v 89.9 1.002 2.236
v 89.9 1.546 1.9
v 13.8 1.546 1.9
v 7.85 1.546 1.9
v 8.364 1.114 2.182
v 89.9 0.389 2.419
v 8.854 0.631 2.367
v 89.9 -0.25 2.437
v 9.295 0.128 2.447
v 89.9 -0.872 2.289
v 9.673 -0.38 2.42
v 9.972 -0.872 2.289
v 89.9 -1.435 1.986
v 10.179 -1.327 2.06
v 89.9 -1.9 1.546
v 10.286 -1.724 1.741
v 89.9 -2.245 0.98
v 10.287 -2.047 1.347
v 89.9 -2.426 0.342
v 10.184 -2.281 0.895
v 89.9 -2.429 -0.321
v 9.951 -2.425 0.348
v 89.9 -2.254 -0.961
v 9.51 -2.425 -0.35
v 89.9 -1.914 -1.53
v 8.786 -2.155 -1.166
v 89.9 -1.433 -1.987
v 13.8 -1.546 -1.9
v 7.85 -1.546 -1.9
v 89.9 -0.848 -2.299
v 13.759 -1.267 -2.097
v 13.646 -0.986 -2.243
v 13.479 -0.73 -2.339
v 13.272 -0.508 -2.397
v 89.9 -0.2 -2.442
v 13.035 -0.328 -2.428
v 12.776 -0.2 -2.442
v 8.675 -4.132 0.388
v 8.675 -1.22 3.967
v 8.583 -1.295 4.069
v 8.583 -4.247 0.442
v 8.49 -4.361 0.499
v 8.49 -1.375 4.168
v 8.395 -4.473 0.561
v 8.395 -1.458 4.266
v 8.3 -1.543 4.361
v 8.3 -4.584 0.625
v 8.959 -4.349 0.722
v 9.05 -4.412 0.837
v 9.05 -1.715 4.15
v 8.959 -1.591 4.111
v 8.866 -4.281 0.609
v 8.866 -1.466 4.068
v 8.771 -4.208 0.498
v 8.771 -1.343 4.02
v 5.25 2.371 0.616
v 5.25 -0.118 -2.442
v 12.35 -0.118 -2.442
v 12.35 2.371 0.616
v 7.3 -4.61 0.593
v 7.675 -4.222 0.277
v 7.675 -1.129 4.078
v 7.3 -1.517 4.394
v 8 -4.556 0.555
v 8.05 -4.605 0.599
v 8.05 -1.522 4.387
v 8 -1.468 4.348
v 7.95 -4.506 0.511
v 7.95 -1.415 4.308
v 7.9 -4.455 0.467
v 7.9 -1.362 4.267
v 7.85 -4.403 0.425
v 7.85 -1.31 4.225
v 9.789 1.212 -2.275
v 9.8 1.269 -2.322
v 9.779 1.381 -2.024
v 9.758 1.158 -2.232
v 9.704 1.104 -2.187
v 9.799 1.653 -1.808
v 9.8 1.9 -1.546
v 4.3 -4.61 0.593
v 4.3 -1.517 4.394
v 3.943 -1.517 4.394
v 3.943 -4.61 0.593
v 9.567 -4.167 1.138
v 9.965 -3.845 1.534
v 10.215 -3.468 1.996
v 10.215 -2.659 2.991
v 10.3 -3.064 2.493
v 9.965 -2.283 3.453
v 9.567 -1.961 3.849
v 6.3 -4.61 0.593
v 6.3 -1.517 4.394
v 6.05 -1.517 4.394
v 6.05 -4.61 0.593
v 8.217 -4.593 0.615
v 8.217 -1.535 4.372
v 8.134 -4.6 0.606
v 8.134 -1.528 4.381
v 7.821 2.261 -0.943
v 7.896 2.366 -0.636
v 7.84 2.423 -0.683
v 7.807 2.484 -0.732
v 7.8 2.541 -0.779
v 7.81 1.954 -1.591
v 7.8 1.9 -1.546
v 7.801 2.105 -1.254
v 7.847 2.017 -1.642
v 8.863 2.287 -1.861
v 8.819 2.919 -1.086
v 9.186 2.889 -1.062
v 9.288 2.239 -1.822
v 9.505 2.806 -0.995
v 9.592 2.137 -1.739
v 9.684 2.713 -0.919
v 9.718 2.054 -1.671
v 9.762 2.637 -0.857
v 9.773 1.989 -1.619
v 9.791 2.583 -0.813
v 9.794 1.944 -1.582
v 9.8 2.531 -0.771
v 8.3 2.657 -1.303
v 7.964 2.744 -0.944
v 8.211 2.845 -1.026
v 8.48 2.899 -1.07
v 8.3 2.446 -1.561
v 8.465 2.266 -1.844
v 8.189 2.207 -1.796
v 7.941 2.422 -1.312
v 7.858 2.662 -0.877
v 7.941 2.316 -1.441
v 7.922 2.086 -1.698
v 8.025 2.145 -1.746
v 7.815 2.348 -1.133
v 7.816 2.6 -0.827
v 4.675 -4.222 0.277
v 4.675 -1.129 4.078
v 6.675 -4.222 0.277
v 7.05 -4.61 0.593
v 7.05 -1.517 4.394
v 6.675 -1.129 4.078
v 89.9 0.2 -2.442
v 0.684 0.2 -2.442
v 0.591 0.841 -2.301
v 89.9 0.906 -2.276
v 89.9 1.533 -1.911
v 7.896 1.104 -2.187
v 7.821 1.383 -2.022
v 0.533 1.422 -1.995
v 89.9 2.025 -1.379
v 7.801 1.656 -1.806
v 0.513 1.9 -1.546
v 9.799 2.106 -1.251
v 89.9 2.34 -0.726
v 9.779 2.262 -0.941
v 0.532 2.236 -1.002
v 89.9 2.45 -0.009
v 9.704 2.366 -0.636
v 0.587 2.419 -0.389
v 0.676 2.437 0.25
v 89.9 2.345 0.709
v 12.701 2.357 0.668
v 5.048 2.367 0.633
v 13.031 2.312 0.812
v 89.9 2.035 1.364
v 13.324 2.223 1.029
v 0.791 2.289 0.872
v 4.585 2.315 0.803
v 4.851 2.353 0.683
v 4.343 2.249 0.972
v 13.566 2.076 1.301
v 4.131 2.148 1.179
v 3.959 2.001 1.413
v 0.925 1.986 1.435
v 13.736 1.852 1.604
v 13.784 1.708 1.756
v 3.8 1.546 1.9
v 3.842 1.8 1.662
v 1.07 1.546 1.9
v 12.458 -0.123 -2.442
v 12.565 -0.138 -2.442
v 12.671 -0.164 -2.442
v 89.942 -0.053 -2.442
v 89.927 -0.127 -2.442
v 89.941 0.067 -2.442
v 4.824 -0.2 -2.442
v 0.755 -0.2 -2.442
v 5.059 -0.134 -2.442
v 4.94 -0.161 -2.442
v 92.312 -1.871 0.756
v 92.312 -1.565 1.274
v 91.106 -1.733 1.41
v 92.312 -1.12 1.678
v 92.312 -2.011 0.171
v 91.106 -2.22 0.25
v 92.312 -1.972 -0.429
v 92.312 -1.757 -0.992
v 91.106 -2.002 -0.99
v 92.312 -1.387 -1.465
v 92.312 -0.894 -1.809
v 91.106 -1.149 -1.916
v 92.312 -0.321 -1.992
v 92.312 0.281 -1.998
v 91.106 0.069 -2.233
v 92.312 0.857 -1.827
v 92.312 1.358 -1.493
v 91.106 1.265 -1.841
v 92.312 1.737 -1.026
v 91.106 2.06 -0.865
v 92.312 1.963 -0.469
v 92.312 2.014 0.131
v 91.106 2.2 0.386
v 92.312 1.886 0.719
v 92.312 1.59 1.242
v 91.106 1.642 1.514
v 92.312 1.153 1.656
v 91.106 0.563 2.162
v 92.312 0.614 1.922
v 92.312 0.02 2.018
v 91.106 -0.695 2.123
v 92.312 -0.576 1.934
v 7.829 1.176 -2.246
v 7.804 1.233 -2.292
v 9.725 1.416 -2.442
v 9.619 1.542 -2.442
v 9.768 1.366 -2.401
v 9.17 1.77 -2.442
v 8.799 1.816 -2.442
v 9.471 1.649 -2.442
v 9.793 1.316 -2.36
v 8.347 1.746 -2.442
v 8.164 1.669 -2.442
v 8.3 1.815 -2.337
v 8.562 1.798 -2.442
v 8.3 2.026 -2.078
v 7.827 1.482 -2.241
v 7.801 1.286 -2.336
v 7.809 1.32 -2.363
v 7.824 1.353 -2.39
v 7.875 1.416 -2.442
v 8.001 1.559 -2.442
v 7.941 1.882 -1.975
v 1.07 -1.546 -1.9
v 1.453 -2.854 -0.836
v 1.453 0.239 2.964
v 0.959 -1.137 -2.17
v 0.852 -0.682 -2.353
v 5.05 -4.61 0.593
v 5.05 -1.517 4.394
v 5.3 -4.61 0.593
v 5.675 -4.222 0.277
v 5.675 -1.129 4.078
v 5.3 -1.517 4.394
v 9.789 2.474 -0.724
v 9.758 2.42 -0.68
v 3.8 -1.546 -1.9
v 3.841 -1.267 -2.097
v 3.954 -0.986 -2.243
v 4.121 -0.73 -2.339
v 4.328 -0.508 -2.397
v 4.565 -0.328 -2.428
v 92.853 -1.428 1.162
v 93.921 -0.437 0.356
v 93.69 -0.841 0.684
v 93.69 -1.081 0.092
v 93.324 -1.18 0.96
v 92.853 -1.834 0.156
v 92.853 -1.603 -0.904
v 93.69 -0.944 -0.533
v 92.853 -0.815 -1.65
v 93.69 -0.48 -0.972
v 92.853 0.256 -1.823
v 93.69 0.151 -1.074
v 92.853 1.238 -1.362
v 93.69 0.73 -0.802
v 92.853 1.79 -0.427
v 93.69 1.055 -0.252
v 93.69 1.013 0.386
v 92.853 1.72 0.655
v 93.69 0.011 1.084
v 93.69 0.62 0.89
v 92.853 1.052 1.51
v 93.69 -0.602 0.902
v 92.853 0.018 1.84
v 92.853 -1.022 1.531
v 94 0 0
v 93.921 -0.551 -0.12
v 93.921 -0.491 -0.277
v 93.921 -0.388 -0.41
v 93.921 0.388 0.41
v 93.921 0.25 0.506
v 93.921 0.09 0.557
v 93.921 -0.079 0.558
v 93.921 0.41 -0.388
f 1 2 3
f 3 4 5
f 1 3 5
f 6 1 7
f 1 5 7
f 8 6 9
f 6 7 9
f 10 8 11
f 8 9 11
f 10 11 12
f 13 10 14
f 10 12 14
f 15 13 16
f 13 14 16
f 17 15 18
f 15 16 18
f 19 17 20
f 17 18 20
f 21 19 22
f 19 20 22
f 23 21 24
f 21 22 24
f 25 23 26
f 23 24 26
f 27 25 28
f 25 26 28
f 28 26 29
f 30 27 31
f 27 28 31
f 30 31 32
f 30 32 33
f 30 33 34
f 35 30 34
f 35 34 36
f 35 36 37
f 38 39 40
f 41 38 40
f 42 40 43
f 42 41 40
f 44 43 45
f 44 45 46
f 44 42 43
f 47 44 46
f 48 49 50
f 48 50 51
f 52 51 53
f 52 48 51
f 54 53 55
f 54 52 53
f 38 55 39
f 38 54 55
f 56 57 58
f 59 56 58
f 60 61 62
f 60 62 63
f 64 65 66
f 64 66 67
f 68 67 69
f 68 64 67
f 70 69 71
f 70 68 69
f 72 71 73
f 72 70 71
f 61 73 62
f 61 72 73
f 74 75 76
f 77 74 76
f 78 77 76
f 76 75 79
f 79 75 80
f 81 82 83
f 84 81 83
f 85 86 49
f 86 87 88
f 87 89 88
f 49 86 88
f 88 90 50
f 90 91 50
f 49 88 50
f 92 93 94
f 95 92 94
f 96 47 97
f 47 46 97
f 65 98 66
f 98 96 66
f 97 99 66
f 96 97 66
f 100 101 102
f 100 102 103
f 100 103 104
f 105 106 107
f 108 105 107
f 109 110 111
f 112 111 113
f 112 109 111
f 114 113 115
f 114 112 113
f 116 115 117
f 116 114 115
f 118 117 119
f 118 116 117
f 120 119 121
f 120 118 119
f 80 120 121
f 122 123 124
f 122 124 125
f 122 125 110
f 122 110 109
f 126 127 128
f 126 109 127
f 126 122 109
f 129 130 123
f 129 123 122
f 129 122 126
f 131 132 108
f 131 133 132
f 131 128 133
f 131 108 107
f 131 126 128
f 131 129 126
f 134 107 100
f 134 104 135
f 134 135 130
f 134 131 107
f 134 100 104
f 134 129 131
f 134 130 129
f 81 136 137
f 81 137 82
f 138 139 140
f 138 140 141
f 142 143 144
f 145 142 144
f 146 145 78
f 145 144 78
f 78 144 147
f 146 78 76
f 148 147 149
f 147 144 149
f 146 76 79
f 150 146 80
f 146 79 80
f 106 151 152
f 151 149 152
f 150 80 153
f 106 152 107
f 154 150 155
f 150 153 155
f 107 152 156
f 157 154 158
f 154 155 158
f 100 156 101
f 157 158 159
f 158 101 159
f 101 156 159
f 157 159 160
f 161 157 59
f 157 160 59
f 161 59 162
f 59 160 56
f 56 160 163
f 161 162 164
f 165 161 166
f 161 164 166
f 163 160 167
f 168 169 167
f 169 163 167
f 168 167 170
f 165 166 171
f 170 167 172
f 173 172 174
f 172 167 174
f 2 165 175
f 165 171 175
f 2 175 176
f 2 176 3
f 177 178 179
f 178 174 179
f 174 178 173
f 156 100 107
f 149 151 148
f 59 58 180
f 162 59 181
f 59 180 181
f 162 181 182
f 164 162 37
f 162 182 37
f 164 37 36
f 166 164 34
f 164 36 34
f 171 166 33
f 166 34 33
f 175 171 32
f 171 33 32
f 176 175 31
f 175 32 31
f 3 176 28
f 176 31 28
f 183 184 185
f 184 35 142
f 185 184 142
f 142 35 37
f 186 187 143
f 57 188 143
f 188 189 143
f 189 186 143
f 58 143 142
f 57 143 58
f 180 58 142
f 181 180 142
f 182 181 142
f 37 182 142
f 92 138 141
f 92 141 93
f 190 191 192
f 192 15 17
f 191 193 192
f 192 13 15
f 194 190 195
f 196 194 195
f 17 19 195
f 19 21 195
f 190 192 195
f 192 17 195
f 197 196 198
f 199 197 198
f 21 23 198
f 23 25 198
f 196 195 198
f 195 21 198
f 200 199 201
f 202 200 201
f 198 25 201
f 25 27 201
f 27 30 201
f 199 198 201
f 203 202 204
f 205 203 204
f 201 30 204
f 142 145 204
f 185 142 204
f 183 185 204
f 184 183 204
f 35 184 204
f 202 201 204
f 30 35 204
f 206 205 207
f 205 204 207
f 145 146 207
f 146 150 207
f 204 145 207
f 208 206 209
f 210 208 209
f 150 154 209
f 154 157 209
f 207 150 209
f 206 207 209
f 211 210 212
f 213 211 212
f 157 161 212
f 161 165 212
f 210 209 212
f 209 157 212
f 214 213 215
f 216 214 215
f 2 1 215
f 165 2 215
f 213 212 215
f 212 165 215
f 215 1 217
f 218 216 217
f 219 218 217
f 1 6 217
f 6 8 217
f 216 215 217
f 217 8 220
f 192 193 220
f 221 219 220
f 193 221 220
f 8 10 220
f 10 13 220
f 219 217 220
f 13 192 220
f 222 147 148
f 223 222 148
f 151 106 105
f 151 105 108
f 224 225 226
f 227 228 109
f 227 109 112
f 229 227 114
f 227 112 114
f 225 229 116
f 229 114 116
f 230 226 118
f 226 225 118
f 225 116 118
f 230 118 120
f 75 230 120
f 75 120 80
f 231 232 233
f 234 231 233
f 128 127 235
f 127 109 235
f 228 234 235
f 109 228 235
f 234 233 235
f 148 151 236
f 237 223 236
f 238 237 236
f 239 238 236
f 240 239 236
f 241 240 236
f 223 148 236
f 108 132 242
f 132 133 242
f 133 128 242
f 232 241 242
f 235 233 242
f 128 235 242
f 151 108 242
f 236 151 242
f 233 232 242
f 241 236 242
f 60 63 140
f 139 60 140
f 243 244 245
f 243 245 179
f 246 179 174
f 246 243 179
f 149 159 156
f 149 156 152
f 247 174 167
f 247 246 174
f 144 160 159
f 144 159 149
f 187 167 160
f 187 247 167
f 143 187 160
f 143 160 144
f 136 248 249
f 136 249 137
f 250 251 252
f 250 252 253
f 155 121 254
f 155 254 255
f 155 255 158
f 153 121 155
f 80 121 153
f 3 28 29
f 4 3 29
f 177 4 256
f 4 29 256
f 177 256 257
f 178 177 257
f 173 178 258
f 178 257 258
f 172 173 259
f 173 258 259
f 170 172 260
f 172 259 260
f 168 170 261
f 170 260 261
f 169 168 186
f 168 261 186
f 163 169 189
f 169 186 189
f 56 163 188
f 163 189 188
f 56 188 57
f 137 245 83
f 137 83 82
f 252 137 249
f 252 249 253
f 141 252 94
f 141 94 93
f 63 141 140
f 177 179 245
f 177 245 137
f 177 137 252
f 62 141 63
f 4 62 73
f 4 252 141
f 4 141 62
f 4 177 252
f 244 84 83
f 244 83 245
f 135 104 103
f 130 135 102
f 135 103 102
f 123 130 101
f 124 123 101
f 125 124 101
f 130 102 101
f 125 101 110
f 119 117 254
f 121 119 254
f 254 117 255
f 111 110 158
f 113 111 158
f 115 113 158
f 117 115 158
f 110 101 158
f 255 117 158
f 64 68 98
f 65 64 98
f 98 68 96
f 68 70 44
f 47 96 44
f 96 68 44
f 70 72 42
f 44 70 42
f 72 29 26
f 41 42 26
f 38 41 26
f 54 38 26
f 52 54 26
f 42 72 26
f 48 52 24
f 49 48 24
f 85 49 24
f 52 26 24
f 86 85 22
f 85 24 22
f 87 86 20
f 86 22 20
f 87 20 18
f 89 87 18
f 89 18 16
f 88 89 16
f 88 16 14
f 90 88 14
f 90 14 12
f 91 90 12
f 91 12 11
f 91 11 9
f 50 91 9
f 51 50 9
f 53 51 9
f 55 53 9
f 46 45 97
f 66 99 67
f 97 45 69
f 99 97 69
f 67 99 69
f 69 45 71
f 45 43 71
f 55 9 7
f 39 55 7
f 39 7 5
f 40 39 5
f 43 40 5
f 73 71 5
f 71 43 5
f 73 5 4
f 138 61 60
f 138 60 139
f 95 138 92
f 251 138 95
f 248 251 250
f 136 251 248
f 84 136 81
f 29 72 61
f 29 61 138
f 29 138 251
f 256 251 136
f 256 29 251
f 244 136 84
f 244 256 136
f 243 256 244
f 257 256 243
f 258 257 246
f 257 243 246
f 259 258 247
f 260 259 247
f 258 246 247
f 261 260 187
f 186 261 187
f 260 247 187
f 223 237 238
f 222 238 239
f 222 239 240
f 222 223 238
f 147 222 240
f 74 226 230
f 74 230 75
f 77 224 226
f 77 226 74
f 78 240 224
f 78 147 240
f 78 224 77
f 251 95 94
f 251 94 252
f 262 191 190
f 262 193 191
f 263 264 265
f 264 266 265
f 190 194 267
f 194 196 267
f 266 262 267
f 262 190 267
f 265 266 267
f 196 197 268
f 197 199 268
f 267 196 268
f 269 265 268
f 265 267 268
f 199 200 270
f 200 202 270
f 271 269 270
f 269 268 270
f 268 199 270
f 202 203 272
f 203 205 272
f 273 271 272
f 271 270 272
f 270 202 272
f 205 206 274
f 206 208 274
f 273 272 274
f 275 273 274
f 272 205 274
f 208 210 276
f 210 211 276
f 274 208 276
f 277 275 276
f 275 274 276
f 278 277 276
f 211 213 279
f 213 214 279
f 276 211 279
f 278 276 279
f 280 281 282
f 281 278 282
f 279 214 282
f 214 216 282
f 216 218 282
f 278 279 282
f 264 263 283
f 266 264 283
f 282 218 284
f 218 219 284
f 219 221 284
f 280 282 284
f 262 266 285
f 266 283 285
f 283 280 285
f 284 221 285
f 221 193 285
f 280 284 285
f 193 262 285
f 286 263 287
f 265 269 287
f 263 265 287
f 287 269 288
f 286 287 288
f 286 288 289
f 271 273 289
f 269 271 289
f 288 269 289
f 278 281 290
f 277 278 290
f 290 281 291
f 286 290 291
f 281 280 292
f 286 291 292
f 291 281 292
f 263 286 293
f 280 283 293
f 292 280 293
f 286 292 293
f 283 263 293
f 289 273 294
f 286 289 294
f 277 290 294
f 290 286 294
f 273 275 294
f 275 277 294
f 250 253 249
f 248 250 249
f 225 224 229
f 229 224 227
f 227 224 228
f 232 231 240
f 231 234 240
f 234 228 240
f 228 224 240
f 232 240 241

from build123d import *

# Parameters (mm, degrees)
SKETCH_R             = 2.45
PAD_DEPTH            = 94
PAD001_DEPTH         = 3.95
POCKET_DEPTH         = 5
POCKET001_DEPTH      = 5
PAD002_DEPTH         = 1
PAD002_DEPTH_BACK    = 1
POCKET002_DEPTH      = 10
POCKET003_DEPTH      = 100
POCKET003_DEPTH_BACK = -100
BODY_PLACEMENT_ANGLE = 50.86


with BuildPart() as part:
    # Sketch → Pad (new body)
    with BuildSketch(Plane.YZ):
        Circle(SKETCH_R)
    extrude(amount=PAD_DEPTH)

    # Sketch001 → Pad001 (join)
    with BuildSketch(Plane.XY):
        with BuildLine():
            Line((0, -2.45), (0, 2.45))
            Line((0, 2.45), (7.85, 2.45))
            ThreePointArc((7.85, -2.45), (10.3, 0), (7.85, 2.45))
            Line((7.85, -2.45), (0, -2.45))
        make_face()
    extrude(amount=PAD001_DEPTH)

    # Sketch002 (on Face4 of Pad001) → Pocket (cut)
    with BuildSketch(Plane(origin=(0, -2.45, 0), x_dir=(0, 0, -1), z_dir=(0, -1, 0))):
        Polygon((-3.95, 3.943303), (-1.685825, 1.452711), (2.45, 0.512751), (2.45, -0.487249), (-3.95, -0.487249), align=None)
    extrude(amount=-POCKET_DEPTH, mode=Mode.SUBTRACT)

    # Sketch003 (on Face3 of Pocket) → Pocket001 (cut)
    with BuildSketch(Plane(origin=(0, -2.45, 0), x_dir=(0, 0, -1), z_dir=(0, -1, 0))):
        Polygon((-3.95, 8.3), (-3.95, 8.05), (-3.45, 7.675), (-3.95, 7.3), (-3.95, 7.05), (-3.45, 6.675), (-3.95, 6.3), (-3.95, 6.05), (-3.45, 5.675), (-3.95, 5.3), (-3.95, 5.05), (-3.45, 4.675), (-3.95, 4.3), (-4.95, 4.3), (-4.95, 9.05), (-3.95, 9.05), (-3.45, 8.675), align=None)
    extrude(amount=-POCKET001_DEPTH, mode=Mode.SUBTRACT)

    # Sketch004 → Pad002 (join, two sides)
    with BuildSketch(Plane.XZ) as pad002_sk:
        with BuildLine():
            add(Edge.make_bspline(
                [(9.8, -2.45), (9.8, -1.583975), (8.3, -2.016987), (6.8, -2.45), (8.3, -2.883013), (9.8, -3.316025), (9.8, -2.45)],
                knots=[0, 0, 0, 2.094395, 2.094395, 4.18879, 4.18879, 6.283185, 6.283185, 6.283185], degree=2, weights=[1, 0.5, 1, 0.5, 1, 0.5, 1]))
        make_face()
    extrude(amount=PAD002_DEPTH)
    extrude(pad002_sk.sketch, amount=-PAD002_DEPTH_BACK)

    # Sketch006 (on Face2 of Pad002) → Pocket002 (cut)
    with BuildSketch(Plane(origin=(0, -2.45, 0), x_dir=(0, 0, -1), z_dir=(0, -1, 0))):
        with BuildLine():
            Line((1.45, 5.25), (1.45, 12.35))
            ThreePointArc((1.45, 12.35), (1.025305, 13.375305), (0, 13.8))
            Line((0, 13.8), (0, 3.8))
            ThreePointArc((0, 3.8), (1.025305, 4.224695), (1.45, 5.25))
        make_face()
    extrude(amount=-POCKET002_DEPTH, mode=Mode.SUBTRACT)

    # Sketch005 → Groove (revolve, cut)
    with BuildSketch(Plane.XZ):
        with BuildLine():
            ThreePointArc((94, 0), (93.52222, 1.315522), (92.311596, 2.017847))
            Line((92.311596, 2.017847), (89.9, 2.45))
            Line((89.9, 2.45), (94, 2.45))
            Line((94, 2.45), (95, 2.45))
            Line((95, 2.45), (95, 0))
            Line((95, 0), (94, 0))
        make_face()
    revolve(axis=Axis((0, 0, 0), (1, 0, 0)), mode=Mode.SUBTRACT)

    # Sketch007 → Pocket003 (cut, two sides)
    with BuildSketch(Plane.YZ) as pocket003_sk:
        Polygon((-0.747522, -2.95), (-2.020175, -2.95), (-2.020175, -1.386144), align=None)
    extrude(amount=-POCKET003_DEPTH, mode=Mode.SUBTRACT)
    extrude(pocket003_sk.sketch, amount=-POCKET003_DEPTH_BACK, mode=Mode.SUBTRACT)


with BuildPart() as part_1:
    # Body placement: moved
    add(part.part.rotate(Axis((0, 0, 0), (1, 0, 0)), BODY_PLACEMENT_ANGLE))


solid = part_1.part
